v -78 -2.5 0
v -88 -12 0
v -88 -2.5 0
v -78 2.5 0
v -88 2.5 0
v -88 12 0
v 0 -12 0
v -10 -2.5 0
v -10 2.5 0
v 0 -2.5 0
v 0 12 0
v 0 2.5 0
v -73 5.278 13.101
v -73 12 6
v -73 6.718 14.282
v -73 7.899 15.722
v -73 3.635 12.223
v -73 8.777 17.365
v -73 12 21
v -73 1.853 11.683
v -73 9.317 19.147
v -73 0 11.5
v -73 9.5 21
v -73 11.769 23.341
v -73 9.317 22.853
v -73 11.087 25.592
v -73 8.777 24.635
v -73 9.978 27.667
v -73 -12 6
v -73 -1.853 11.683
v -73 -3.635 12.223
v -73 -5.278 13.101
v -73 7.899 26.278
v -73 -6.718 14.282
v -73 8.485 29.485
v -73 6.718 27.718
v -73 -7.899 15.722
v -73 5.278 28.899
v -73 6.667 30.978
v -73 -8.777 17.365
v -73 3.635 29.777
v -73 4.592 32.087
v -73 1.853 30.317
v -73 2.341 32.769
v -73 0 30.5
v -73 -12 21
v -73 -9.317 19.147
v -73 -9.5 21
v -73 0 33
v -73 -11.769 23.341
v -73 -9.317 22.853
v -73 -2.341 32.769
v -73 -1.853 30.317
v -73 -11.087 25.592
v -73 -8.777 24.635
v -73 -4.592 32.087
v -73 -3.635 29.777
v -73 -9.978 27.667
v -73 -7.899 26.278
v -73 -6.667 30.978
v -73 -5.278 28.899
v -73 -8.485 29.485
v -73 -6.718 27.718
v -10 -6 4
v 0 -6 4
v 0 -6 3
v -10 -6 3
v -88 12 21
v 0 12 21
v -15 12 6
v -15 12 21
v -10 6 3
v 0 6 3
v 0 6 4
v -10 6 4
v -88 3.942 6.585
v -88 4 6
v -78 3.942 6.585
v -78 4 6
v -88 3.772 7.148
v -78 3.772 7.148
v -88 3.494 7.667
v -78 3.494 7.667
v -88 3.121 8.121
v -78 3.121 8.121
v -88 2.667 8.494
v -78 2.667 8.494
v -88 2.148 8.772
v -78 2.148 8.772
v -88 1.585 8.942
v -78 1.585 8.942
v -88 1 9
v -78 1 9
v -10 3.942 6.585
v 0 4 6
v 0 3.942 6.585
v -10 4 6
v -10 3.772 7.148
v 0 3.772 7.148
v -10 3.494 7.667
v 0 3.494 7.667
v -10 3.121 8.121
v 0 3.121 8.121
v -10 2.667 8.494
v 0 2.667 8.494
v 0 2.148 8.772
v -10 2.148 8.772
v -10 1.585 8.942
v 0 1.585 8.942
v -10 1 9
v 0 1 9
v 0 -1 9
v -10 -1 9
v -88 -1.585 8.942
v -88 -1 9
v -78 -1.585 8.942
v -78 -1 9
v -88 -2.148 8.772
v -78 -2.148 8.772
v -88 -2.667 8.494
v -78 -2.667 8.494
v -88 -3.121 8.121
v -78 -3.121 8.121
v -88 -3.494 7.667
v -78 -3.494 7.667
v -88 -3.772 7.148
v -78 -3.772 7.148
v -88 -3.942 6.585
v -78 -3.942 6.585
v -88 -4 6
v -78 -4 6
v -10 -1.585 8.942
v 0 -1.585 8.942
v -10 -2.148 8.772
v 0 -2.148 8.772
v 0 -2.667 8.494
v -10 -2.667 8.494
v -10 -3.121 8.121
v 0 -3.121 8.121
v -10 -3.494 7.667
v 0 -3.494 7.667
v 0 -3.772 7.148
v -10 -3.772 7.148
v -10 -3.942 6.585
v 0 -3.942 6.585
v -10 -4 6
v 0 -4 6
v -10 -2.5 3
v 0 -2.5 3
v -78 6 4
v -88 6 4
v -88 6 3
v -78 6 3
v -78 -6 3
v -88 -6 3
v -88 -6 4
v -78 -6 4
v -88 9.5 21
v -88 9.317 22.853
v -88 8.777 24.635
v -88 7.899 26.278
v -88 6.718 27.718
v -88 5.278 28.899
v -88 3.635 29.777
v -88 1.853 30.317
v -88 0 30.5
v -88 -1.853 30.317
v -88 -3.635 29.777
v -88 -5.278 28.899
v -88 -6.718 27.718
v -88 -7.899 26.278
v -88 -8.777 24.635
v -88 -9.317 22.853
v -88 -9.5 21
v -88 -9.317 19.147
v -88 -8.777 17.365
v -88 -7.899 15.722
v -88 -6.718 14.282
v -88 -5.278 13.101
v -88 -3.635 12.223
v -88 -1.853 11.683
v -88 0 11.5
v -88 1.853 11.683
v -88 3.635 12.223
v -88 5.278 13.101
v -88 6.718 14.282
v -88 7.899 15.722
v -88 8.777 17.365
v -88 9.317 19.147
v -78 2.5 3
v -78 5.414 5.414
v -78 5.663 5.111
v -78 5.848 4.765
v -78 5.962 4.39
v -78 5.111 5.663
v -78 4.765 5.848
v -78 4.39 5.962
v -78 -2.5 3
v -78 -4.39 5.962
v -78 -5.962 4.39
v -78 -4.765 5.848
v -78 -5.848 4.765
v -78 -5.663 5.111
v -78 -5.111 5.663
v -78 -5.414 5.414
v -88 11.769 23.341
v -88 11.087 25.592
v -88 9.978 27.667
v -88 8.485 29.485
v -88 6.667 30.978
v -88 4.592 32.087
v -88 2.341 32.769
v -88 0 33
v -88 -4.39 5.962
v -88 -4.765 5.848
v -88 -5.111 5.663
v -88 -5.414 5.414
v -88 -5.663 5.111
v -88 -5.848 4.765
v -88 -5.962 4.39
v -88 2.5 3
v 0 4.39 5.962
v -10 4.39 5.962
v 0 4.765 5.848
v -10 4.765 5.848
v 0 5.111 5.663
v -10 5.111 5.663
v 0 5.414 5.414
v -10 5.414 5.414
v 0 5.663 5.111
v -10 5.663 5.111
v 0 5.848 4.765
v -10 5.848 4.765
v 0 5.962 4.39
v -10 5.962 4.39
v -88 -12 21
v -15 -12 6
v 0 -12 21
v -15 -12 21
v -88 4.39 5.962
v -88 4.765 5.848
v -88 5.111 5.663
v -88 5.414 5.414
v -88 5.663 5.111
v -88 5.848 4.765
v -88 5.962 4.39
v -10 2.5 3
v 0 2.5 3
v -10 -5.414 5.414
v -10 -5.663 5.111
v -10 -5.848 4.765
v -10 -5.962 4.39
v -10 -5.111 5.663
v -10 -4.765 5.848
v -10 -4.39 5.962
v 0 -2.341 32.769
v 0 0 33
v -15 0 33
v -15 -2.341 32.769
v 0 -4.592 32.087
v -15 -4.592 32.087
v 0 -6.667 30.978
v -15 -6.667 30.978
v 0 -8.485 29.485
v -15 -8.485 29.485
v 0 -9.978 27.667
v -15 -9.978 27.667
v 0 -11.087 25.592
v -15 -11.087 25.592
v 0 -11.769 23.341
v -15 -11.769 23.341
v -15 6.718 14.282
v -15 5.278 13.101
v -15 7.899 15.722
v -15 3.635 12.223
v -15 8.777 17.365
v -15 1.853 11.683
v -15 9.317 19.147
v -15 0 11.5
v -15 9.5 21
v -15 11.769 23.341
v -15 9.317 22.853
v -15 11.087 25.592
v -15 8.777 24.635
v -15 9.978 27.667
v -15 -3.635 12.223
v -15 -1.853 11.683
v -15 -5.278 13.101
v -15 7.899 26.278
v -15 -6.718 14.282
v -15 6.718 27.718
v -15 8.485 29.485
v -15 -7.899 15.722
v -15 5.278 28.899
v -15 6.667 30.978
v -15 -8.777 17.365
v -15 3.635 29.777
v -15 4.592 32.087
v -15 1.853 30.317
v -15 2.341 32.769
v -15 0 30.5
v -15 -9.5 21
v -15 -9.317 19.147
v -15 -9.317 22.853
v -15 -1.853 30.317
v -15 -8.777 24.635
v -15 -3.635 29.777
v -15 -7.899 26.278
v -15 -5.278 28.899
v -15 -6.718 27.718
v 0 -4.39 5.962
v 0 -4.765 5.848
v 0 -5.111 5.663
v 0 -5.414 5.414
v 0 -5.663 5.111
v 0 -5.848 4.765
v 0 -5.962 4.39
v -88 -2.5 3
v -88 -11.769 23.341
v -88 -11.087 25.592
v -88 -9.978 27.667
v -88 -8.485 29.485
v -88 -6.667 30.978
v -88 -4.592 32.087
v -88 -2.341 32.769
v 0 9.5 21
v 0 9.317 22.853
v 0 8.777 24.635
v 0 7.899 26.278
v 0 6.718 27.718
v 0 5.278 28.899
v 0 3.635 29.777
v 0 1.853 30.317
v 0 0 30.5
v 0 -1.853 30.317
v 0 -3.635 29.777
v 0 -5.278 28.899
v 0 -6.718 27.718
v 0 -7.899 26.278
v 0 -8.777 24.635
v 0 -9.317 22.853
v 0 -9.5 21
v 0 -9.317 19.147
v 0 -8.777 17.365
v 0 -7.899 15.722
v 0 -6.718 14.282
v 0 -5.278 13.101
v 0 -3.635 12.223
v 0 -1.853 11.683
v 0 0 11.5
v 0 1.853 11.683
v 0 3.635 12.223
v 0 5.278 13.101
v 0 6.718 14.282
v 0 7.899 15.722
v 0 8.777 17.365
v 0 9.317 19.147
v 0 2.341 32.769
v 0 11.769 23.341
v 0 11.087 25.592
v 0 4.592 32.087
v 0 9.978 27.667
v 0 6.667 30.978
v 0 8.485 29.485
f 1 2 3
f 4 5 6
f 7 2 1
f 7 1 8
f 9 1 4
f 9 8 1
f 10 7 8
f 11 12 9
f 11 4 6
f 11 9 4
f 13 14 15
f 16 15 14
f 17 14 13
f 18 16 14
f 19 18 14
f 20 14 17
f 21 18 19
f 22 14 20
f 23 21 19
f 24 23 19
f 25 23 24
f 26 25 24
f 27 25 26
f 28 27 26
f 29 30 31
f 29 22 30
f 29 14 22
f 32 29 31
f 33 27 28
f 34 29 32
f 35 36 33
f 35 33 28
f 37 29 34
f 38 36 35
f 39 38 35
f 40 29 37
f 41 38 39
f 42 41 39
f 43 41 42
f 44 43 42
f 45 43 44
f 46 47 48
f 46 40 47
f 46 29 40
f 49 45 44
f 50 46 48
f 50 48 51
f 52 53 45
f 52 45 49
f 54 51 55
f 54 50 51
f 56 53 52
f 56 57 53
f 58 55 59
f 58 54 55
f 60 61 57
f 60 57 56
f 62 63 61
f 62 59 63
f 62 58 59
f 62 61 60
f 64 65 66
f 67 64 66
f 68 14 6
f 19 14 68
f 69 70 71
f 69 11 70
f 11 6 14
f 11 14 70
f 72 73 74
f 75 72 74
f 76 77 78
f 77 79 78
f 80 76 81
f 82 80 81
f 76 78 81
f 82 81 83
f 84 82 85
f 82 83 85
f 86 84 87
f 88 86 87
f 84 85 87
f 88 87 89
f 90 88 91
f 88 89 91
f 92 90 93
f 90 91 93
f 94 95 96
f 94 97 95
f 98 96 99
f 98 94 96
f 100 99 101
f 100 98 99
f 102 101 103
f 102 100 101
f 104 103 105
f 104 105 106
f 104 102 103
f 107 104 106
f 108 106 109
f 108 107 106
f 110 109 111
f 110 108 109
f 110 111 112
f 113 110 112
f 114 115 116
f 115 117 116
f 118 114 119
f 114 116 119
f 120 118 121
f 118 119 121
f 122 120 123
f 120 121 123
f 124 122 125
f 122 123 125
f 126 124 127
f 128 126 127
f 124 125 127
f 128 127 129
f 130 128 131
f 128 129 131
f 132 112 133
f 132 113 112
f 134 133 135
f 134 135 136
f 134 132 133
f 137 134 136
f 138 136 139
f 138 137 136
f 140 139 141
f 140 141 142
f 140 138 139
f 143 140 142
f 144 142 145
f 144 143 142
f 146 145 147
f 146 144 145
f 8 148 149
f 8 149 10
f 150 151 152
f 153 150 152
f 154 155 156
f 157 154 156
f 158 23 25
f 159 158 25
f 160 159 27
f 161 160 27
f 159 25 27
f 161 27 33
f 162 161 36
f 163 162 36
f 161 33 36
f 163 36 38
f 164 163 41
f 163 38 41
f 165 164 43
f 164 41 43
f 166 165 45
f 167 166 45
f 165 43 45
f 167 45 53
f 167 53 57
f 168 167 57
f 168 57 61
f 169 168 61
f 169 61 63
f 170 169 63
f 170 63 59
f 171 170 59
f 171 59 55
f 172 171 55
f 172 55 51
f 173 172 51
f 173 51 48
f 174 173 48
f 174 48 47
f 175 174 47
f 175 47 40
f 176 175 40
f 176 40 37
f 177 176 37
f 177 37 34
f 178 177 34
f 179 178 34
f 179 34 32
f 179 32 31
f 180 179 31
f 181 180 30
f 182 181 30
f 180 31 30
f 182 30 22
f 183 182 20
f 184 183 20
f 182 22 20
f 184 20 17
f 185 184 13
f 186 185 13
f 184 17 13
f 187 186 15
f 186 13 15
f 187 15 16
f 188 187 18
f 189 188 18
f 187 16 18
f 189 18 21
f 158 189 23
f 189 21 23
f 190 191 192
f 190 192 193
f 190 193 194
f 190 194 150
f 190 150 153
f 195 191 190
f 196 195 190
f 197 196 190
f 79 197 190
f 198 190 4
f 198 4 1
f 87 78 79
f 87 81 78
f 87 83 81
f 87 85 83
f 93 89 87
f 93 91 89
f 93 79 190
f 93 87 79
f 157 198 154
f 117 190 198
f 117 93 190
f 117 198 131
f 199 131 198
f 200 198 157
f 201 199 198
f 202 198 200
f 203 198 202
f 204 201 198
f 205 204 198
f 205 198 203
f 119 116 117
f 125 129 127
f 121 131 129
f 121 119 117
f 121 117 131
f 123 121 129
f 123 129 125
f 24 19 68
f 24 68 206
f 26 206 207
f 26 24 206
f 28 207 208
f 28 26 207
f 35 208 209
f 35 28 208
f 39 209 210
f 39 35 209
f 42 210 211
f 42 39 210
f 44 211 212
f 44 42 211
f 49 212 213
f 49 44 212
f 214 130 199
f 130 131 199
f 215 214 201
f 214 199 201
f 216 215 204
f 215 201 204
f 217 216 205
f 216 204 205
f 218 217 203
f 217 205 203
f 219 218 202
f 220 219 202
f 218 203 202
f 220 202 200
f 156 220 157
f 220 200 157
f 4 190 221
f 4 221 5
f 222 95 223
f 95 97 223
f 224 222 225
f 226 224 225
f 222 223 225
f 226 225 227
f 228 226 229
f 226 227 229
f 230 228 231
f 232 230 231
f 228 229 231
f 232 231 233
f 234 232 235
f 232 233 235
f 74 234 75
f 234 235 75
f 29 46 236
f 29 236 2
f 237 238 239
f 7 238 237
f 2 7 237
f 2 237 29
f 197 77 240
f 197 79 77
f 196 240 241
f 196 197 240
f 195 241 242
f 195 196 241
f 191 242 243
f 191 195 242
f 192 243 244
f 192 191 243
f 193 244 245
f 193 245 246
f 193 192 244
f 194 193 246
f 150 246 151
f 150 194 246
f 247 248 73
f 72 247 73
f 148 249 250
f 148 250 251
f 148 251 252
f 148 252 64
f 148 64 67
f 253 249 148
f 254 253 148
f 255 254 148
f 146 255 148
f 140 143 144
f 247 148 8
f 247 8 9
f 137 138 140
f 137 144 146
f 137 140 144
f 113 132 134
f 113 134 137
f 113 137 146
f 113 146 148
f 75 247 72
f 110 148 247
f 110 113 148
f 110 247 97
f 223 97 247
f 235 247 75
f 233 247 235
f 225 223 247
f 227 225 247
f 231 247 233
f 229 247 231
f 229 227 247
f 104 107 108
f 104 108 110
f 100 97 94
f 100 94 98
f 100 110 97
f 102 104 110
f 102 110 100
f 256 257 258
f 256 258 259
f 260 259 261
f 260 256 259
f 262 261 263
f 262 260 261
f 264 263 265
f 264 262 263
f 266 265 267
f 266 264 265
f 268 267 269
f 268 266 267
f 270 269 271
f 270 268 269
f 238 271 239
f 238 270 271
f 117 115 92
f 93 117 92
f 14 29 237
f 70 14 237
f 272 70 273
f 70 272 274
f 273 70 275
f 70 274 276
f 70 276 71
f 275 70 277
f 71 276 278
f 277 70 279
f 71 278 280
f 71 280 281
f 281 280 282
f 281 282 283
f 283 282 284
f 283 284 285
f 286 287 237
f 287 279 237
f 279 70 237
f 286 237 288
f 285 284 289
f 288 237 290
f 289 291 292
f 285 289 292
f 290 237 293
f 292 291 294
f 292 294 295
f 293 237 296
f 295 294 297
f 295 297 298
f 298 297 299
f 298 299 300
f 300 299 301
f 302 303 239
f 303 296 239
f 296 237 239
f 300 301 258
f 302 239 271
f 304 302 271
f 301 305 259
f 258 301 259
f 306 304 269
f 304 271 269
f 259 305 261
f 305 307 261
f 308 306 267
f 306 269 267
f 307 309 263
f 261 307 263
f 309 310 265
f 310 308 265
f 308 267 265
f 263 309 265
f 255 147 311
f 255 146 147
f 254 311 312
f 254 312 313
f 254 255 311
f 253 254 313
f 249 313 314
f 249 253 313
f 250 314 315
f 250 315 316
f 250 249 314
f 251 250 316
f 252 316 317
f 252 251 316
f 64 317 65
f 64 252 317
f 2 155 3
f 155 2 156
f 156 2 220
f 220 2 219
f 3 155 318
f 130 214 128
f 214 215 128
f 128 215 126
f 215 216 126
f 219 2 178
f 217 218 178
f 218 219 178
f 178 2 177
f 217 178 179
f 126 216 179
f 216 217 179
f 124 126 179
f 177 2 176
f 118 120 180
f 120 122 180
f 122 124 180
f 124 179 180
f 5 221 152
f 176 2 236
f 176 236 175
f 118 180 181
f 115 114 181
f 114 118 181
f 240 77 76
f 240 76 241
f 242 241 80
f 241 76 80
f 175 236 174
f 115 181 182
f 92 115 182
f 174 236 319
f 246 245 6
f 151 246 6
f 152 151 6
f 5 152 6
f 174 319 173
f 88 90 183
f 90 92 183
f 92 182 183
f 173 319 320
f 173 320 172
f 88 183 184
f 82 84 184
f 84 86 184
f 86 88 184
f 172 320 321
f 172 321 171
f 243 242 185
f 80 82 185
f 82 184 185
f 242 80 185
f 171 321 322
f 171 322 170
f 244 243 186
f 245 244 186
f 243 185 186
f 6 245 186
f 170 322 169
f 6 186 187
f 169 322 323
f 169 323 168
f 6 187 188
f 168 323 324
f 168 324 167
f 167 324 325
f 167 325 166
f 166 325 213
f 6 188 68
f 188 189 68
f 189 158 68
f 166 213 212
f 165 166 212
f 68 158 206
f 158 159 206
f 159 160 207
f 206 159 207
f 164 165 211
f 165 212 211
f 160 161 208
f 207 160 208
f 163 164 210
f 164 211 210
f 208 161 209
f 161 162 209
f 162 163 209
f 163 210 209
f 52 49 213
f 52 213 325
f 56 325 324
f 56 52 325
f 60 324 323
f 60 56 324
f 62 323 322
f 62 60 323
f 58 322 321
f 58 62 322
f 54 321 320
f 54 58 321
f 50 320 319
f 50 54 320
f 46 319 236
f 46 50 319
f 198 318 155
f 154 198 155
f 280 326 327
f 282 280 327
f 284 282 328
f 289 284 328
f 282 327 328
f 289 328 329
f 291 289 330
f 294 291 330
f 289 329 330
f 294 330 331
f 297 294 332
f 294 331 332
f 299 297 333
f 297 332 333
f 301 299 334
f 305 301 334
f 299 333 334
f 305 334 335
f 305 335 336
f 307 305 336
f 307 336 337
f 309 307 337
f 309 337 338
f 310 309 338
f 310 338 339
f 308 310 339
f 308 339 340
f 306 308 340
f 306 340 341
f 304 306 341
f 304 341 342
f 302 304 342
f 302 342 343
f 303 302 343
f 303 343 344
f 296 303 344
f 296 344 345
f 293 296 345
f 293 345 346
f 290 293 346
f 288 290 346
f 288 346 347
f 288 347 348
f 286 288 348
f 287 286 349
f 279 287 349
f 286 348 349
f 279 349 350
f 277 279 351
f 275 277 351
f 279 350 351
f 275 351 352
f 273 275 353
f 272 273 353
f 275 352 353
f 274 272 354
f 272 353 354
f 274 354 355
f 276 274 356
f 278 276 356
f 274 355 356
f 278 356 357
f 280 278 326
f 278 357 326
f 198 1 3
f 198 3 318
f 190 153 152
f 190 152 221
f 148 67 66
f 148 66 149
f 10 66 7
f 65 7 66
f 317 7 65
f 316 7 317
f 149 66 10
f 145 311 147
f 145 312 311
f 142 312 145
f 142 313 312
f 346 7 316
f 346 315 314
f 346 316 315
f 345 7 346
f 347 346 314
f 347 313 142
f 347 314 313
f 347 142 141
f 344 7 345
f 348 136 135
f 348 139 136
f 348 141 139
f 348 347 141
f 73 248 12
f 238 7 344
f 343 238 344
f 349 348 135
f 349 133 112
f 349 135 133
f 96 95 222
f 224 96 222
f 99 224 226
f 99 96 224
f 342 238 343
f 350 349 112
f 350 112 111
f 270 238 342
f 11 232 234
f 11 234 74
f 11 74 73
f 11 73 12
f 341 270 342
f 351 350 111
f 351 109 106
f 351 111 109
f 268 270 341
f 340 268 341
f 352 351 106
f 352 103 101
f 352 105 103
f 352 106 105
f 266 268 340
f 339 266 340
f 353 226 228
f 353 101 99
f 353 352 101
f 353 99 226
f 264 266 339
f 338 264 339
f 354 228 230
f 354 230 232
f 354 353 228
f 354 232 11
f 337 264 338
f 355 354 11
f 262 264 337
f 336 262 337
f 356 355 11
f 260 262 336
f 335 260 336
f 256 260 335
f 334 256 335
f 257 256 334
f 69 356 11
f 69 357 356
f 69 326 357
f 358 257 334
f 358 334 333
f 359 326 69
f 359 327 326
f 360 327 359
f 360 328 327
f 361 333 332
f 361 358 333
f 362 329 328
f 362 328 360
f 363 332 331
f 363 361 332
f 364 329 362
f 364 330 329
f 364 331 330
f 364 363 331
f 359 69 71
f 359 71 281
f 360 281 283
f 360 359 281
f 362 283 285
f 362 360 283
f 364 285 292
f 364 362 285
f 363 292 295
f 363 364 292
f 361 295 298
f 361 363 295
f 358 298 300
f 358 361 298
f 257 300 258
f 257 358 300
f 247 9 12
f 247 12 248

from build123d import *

# Parameters (mm, degrees)
F0_R     = 9.5
F1_DEPTH = 88
F2_W     = 58
F2_H     = 27
F3_DEPTH = 12.5
F4_DEPTH = 10
F6_DEPTH = 10
F7_R     = 2.99999
F8_R     = 1.99999


# Not quite as in the source:
# - a fillet or chamfer is up to 0.001 mm smaller than in the source, because OpenCascade refuses the exact size


with BuildPart() as f1:
    # F0 (on Right) → F1 (new body)
    with BuildSketch(Plane.YZ):
        with BuildLine():
            ThreePointArc((0, 9), (-8.4852813742, 12.5147186258), (-12, 21))
            Line((-12, 21), (-12, 0))
            Line((-12, 0), (-2.5, 0))
            Line((-2.5, 0), (-2.5, 3))
            Line((-2.5, 3), (-6, 3))
            Line((-6, 3), (-6, 6))
            Line((-6, 6), (-4, 6))
            Line((-4, 6), (-4, 9))
            Line((-4, 9), (0, 9))
        make_face()
        Polygon((4, 9), (0, 9), (-4, 9), (-4, 6), (-6, 6), (-6, 3), (-2.5, 3), (-2.5, 0), (2.5, 0), (2.5, 3), (6, 3), (6, 6), (4, 6), align=None)
        with BuildLine():
            Line((12, 0), (12, 21))
            ThreePointArc((12, 21), (8.4852813742, 12.5147186258), (0, 9))
            Line((0, 9), (4, 9))
            Line((4, 9), (4, 6))
            Line((4, 6), (6, 6))
            Line((6, 6), (6, 3))
            Line((6, 3), (2.5, 3))
            Line((2.5, 3), (2.5, 0))
            Line((2.5, 0), (12, 0))
        make_face()
        with BuildLine():
            ThreePointArc((12, 21), (8.4852813742, 29.4852813742), (0, 33))
            ThreePointArc((0, 33), (-8.4852813742, 29.4852813742), (-12, 21))
            ThreePointArc((-12, 21), (-8.4852813742, 12.5147186258), (0, 9))
            ThreePointArc((0, 9), (8.4852813742, 12.5147186258), (12, 21))
        make_face()
        with Locations((0, 21)):
            Circle(F0_R, mode=Mode.SUBTRACT)
    extrude(amount=-F1_DEPTH)

    # F2 (on Front) → F3 (cut, symmetric)
    with BuildSketch(Plane.XZ):
        with Locations((-44, 19.5)):
            Rectangle(F2_W, F2_H)
    extrude(amount=F3_DEPTH, both=True, mode=Mode.SUBTRACT)

    # F0 (on Right) → F4 (cut)
    with BuildSketch(Plane.YZ):
        Polygon((4, 9), (0, 9), (-4, 9), (-4, 6), (-6, 6), (-6, 3), (-2.5, 3), (-2.5, 0), (2.5, 0), (2.5, 3), (6, 3), (6, 6), (4, 6), align=None)
    extrude(amount=-F4_DEPTH, mode=Mode.SUBTRACT)

    # F5 (on face) → F6 (cut)
    with BuildSketch(Plane(origin=(-88, 0, 0), x_dir=(0, -1, 0), z_dir=(-1, 0, 0))):
        Polygon((-2.5, 3), (-2.5, 0), (2.5, 0), (2.5, 3), (6, 3), (6, 6), (4, 6), (4, 9), (0, 9), (-4, 9), (-4, 6), (-6, 6), (-6, 3), align=None)
    extrude(amount=-F6_DEPTH, mode=Mode.SUBTRACT)

    # F7 (radius 3 in the source; OpenCascade refuses exactly that, so slightly less here)
    f7_edges = [f1.edges().sort_by_distance(p)[0] for p in [
        (-83, 4, 9),
        (-83, -4, 9),
        (-5, -4, 9),
        (-5, 4, 9),
    ]]
    fillet(f7_edges, radius=F7_R)

    # F8 (radius 2 in the source; OpenCascade refuses exactly that, so slightly less here)
    f8_edges = [f1.edges().sort_by_distance(p)[0] for p in [
        (-83, -6, 6),
        (-83, 6, 6),
        (-5, 6, 6),
        (-5, -6, 6),
    ]]
    fillet(f8_edges, radius=F8_R)


solid = f1.part
